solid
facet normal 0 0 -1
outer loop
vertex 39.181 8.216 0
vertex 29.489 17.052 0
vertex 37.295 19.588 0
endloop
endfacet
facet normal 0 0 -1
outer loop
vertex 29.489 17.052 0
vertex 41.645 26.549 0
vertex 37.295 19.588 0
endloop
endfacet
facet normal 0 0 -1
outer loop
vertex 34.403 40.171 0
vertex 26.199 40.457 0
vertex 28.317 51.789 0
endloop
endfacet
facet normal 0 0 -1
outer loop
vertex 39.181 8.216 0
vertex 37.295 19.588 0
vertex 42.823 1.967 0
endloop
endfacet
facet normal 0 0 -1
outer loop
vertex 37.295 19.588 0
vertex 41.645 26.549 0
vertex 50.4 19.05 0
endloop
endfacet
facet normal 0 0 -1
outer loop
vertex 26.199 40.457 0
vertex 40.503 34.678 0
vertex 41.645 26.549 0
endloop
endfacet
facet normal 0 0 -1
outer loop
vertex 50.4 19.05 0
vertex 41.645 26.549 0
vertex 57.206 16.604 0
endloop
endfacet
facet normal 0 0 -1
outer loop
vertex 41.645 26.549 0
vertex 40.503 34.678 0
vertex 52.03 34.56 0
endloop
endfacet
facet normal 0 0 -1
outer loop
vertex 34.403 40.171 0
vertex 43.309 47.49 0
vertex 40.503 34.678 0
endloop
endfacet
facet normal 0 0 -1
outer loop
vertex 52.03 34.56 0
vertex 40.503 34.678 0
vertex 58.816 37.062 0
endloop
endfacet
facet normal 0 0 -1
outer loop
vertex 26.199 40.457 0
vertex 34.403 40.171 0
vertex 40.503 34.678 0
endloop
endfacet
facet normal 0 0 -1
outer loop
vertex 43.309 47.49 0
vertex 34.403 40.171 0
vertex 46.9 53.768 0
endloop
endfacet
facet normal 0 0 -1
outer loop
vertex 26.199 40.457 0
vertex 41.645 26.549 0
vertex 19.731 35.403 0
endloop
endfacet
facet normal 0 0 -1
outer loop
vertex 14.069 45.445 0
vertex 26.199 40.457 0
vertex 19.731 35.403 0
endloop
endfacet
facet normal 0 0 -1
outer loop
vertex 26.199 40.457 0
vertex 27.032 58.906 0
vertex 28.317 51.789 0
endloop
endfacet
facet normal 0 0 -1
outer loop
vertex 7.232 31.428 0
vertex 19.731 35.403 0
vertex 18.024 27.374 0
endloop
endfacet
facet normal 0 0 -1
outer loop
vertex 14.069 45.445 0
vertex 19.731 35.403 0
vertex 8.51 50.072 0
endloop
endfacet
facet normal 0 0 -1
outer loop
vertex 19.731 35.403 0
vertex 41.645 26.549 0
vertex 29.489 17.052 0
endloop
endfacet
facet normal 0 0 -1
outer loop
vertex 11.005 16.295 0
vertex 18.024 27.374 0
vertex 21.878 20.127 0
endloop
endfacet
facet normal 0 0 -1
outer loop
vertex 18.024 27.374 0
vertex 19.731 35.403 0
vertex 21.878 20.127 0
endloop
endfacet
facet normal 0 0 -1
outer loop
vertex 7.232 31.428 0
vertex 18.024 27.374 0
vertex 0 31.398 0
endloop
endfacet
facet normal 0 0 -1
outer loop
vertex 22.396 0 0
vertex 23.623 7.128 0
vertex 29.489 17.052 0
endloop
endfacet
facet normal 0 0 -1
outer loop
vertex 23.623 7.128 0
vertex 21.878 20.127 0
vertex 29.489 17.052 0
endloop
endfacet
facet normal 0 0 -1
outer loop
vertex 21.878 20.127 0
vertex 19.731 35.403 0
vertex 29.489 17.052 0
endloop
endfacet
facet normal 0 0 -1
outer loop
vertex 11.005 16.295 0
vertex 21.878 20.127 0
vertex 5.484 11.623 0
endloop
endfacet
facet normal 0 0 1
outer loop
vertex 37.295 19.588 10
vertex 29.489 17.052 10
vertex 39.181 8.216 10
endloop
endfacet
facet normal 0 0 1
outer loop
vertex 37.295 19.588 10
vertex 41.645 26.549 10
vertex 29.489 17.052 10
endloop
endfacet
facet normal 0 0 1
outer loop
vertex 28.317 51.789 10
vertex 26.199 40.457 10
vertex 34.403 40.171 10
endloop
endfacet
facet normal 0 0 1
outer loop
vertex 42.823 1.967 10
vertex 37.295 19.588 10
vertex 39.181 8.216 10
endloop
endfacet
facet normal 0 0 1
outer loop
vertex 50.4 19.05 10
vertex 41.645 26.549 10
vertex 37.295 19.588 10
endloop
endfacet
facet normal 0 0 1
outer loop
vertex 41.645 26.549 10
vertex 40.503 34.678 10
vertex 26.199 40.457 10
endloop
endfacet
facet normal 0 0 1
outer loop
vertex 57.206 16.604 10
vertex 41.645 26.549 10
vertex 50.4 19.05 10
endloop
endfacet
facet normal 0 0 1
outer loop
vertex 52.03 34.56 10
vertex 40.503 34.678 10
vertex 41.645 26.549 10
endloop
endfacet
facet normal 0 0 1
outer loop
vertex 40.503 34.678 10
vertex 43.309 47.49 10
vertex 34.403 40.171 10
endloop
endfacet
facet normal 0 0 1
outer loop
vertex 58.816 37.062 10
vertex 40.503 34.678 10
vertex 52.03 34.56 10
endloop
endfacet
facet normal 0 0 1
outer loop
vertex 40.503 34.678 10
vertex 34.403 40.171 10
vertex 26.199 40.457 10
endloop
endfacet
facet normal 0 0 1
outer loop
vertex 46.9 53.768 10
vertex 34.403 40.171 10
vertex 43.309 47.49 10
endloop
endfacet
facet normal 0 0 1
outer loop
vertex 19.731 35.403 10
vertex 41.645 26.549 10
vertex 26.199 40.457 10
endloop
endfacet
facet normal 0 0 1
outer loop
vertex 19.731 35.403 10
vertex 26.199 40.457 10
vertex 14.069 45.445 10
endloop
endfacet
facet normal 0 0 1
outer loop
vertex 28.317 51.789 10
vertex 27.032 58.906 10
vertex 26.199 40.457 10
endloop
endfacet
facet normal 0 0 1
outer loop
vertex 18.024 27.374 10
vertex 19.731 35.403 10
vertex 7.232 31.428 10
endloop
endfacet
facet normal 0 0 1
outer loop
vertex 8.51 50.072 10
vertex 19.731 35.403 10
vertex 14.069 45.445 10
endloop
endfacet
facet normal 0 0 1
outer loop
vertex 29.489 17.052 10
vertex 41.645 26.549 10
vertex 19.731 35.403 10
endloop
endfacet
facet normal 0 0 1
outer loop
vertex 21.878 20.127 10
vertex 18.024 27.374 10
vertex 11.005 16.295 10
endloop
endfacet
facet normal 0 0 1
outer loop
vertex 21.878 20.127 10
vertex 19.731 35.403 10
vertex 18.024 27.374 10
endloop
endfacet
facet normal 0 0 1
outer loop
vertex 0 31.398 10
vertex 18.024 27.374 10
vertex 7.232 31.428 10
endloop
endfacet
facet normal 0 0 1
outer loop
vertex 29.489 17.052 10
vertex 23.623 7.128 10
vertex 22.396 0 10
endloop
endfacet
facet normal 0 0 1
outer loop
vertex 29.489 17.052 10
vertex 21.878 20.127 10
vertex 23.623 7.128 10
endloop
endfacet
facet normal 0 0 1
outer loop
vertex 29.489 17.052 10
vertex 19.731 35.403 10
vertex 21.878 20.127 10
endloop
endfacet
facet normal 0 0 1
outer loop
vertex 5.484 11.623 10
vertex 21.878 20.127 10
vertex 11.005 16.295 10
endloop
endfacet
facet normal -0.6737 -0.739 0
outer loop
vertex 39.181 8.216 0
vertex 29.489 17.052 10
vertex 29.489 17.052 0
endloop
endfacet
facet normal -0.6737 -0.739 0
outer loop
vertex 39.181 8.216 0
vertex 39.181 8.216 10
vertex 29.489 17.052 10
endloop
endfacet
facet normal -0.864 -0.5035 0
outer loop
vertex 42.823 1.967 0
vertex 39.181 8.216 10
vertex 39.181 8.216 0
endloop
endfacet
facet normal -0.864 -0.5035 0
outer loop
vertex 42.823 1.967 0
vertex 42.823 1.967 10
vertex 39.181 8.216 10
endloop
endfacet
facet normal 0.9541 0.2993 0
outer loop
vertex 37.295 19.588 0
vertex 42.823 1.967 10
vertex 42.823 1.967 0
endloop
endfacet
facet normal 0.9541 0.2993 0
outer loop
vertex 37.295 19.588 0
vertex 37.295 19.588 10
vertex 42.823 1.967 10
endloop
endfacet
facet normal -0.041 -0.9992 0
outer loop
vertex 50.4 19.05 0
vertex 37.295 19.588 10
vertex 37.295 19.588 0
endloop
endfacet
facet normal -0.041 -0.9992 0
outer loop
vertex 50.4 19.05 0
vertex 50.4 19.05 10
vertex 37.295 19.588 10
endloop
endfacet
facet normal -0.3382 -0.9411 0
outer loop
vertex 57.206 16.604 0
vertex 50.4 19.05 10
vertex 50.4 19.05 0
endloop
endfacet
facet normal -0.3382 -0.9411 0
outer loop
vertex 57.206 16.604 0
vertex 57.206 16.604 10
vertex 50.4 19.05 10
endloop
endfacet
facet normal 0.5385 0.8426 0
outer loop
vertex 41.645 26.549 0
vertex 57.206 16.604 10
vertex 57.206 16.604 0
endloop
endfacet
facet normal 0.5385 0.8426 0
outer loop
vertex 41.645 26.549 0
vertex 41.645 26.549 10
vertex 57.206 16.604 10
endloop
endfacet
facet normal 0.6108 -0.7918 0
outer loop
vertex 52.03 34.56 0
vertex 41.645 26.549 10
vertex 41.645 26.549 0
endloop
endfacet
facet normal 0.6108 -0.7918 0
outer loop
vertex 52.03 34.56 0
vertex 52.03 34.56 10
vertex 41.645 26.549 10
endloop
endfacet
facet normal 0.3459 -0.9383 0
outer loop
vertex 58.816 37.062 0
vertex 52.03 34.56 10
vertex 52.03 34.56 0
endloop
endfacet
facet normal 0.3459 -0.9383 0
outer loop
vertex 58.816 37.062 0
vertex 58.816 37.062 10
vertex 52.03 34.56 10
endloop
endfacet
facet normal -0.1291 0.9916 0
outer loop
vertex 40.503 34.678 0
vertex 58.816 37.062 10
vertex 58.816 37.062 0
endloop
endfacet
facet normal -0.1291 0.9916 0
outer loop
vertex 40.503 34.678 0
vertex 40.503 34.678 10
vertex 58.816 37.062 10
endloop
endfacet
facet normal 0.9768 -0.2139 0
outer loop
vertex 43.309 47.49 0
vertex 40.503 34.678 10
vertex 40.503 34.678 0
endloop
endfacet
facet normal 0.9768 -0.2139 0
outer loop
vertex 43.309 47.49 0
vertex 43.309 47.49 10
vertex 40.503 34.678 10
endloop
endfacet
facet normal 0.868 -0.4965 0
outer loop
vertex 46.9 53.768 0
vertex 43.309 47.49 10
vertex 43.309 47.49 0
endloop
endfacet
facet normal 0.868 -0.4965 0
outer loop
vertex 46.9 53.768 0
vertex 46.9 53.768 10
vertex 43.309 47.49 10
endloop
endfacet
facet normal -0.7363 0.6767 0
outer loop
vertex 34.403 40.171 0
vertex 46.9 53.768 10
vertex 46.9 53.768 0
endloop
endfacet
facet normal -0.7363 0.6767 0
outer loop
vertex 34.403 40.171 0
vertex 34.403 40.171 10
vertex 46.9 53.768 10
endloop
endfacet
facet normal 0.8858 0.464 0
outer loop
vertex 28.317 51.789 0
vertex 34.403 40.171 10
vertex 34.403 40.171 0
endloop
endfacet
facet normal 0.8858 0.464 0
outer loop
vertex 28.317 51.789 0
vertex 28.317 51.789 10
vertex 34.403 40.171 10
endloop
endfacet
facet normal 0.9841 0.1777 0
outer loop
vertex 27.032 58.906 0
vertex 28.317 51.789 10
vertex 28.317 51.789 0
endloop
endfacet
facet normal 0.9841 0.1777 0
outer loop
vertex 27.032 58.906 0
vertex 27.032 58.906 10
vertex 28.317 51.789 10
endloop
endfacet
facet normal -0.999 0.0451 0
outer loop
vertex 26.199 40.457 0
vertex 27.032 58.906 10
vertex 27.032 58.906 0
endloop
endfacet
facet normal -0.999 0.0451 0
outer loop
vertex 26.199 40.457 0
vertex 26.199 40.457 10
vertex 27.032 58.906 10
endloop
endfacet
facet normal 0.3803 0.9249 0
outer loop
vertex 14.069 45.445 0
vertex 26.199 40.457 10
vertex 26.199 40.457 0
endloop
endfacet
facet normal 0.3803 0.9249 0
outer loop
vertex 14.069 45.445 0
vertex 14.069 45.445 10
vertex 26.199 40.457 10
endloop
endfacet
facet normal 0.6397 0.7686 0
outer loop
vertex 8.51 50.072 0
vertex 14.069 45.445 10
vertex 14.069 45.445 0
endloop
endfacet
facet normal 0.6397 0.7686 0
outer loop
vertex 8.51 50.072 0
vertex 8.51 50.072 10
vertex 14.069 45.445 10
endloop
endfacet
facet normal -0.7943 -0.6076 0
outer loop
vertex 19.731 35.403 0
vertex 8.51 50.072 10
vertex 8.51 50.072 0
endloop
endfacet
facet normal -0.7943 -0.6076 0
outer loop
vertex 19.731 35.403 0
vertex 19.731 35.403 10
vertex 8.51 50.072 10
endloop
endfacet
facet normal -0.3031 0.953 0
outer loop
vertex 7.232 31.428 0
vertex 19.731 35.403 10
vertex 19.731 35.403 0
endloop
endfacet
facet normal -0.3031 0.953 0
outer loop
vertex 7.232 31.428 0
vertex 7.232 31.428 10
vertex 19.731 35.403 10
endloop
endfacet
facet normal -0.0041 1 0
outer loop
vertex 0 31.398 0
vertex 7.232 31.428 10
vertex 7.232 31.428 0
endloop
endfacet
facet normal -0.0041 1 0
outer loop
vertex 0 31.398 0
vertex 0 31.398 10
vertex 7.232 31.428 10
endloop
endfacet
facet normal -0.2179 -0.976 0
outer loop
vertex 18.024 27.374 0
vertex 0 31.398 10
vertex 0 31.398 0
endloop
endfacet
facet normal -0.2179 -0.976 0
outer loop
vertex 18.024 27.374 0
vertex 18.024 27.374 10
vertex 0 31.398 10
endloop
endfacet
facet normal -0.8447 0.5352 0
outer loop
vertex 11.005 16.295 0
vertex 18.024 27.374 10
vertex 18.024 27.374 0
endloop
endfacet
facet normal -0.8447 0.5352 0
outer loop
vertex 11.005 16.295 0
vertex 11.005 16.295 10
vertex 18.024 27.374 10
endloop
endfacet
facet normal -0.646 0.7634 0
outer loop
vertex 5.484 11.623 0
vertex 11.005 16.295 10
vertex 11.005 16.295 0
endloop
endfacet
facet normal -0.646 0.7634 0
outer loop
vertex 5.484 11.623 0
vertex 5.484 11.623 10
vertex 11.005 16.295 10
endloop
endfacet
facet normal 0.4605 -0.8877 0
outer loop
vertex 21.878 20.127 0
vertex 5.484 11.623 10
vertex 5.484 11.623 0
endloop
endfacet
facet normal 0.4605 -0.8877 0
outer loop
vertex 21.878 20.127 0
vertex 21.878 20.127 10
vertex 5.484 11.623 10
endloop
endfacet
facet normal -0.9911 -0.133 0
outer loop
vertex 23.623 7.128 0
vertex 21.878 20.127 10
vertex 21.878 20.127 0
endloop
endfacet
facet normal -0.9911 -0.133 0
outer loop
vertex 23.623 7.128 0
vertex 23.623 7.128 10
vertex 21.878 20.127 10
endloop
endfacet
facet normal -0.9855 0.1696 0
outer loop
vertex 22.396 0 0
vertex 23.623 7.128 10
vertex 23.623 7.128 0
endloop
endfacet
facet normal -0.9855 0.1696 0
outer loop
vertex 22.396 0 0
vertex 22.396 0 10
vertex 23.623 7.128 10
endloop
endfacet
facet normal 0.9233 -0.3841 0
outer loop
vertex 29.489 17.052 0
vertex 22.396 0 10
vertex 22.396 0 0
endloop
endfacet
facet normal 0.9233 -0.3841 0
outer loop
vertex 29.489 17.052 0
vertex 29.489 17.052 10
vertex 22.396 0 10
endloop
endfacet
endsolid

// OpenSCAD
$fn = 32;

// ----------------------------------------------------------------------
// Fan rotor section: 9 blades, 12 mm hub radius, 18 mm blades
// ----------------------------------------------------------------------

// --- parameters (mm) ---
profile_height = 10;      // extrusion height
profile_points = 27;      // points of the closed outline

profile = [[41.645, 26.549], [52.03, 34.56], [58.816, 37.062], [40.503, 34.678], [43.309, 47.49], [46.9, 53.768], [34.403, 40.171], [28.317, 51.789], [27.032, 58.906], [26.199, 40.457], [14.069, 45.445], [8.51, 50.072], [19.731, 35.403], [7.232, 31.428], [0, 31.398], [18.024, 27.374], [11.005, 16.295], [5.484, 11.623], [21.878, 20.127], [23.623, 7.128], [22.396, 0], [29.489, 17.052], [39.181, 8.216], [42.823, 1.967], [37.295, 19.588], [50.4, 19.05], [57.206, 16.604]];  // single closed polygon, 27 points, counter clockwise

// --- the one profile operation ---
linear_extrude(height = profile_height) polygon(points = profile);
